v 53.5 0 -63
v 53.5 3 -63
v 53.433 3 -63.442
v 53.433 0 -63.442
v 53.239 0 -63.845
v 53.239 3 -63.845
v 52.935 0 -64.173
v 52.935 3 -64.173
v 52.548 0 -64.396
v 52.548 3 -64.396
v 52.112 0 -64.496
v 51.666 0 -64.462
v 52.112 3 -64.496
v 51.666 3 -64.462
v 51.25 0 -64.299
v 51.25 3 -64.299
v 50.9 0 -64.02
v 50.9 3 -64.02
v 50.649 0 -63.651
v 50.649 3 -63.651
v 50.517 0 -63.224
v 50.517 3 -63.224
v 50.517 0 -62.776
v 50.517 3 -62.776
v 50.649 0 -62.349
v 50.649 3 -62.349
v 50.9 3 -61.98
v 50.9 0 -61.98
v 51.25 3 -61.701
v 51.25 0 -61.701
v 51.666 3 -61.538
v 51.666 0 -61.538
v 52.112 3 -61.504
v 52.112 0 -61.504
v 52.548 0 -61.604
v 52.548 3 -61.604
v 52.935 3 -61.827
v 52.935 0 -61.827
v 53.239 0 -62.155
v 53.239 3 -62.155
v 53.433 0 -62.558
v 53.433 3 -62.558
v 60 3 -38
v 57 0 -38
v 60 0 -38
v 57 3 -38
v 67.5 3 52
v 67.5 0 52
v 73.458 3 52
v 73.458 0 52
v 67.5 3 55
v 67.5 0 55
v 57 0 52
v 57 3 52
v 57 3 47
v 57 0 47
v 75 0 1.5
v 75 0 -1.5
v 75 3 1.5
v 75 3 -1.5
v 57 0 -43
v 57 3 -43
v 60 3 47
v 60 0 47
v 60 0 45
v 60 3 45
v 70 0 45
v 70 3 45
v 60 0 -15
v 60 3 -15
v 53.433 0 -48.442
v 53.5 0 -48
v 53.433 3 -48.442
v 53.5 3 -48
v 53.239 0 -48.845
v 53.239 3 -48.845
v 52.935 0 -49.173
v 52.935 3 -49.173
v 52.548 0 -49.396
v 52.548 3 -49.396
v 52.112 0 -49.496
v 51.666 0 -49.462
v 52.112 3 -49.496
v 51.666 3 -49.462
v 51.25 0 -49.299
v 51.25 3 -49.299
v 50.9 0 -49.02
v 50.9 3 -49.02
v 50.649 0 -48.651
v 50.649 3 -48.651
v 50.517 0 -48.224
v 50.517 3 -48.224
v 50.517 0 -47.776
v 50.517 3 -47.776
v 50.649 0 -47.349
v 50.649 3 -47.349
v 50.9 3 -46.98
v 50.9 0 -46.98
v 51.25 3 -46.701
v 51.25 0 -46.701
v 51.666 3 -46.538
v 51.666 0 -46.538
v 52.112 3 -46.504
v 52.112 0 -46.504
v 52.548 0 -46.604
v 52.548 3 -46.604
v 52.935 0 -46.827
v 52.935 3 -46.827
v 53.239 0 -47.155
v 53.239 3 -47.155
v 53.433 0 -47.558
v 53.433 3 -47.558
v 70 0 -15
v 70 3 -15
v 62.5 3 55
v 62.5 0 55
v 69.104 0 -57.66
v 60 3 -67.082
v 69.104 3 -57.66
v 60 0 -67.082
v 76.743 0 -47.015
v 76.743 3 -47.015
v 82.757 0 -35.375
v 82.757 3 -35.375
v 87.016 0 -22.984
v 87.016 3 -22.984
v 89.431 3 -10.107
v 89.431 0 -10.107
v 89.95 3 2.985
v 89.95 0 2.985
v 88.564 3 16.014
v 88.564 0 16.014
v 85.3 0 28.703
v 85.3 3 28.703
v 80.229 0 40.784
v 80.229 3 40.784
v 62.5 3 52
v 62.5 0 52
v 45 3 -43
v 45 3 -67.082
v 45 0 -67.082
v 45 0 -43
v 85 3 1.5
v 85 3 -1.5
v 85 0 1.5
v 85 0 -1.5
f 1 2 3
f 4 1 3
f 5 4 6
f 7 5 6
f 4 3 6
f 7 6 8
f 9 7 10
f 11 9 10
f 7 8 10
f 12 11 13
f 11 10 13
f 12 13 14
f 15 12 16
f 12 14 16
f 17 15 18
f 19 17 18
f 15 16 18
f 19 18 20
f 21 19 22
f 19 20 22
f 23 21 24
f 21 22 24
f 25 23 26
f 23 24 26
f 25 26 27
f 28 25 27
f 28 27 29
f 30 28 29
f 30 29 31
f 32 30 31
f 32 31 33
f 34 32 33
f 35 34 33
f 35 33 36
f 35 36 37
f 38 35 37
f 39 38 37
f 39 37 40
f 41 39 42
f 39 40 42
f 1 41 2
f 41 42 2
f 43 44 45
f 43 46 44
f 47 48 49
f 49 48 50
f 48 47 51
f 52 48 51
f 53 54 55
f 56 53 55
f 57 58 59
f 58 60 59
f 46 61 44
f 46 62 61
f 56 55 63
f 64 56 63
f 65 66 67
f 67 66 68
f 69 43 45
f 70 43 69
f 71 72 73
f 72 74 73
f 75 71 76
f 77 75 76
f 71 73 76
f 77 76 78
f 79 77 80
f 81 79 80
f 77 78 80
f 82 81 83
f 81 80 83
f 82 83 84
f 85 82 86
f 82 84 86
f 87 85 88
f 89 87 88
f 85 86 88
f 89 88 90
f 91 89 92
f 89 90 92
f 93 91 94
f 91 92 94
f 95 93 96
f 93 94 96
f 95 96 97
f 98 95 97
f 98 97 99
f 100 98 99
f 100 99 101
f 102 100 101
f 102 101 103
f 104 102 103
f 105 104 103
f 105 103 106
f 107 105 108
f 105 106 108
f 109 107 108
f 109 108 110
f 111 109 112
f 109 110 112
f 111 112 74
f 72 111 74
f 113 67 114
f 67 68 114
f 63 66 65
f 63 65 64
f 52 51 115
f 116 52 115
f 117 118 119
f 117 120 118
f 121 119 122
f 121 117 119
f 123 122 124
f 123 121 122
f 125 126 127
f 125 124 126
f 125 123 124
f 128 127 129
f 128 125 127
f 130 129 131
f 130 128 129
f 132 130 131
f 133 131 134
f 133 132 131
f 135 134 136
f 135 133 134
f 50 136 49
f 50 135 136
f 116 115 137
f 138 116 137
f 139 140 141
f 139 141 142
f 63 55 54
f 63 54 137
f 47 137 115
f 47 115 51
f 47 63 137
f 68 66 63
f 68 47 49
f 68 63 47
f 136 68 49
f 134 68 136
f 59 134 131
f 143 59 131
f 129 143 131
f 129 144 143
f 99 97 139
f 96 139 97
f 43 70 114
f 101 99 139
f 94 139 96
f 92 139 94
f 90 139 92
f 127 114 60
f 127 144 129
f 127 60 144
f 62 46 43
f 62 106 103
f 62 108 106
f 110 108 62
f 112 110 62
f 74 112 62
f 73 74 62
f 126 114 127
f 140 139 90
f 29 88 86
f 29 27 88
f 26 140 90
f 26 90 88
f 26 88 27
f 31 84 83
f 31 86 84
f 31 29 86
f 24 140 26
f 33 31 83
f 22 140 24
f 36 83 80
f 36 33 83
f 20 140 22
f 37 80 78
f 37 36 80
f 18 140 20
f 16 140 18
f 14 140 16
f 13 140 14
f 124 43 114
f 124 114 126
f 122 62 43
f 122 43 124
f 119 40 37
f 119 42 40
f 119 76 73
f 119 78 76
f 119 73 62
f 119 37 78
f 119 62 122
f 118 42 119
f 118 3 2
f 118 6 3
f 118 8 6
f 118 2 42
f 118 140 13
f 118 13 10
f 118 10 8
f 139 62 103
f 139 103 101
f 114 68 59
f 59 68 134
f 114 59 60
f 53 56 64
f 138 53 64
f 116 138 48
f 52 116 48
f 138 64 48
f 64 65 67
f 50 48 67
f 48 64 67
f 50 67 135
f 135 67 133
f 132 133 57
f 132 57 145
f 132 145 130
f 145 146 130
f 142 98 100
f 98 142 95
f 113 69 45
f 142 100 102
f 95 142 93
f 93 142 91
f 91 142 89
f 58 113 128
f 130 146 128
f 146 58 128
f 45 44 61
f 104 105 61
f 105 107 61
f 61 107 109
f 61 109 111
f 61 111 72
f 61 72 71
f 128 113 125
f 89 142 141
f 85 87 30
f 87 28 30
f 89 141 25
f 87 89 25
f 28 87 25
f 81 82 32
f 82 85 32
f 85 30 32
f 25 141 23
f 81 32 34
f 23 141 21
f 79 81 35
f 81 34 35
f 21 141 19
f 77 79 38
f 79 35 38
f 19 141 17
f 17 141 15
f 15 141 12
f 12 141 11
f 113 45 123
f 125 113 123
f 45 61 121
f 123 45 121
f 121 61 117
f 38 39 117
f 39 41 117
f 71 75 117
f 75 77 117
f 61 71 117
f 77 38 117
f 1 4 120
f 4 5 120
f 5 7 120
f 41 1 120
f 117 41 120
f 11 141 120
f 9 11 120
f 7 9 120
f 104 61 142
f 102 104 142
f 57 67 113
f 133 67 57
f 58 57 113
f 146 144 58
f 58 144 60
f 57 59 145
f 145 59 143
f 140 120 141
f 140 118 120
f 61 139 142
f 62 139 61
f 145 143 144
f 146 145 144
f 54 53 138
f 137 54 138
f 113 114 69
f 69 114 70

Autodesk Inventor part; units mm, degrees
ref_plane "YZ Plane" through (0, 0, 0) normal (1, 0, 0) x (0, 1, 0)
ref_plane "XZ Plane" through (0, 0, 0) normal (0, 1, 0) x (-1, 0, 0)
ref_plane "XY Plane" through (0, 0, 0) normal (0, 0, 1) x (1, 0, 0)
sketch "Sketch1" plane through (0, 0, 0) normal (0, 1, 0) x (-1, 0, 0)
  circle A0 centre (0, 0) radius 90
  line L0 (73.4575, 52) -> (-73.4575, 52)
  dimension "d0" = 180
  dimension "d1" = 52
extrude "Extrusion1" add sketch "Sketch1" along normal blind 3 contours A0 L0 picked at (17.1608, -0.9679)
sketch "Sketch2" plane through (0, 3, 0) normal (0, 1, 0) x (1, 0, 0)
  line L0 (-73.4575, -52) -> (73.4575, -52) projected
  line L1 (60, -52) -> (-90, -52)
  line L2 (-90, -52) -> (-90, 90)
  line L3 (-90, 90) -> (60, 90)
  line L4 (60, 90) -> (60, -52)
  arc A0 (73.4575, -52) -> (-73.4575, -52) centre (0, 0) ccw projected
  dimension "d4" = 60
extrude "Extrusion2" cut sketch "Sketch2" against normal blind 3 contours A0 L4 L0 | L1 L2 A0 | L2 L3 A0 | A0 L3 L4 picked at (-22.3183, 24.985)
sketch "Sketch3" plane through (0, 3, 0) normal (0, 1, 0) x (1, 0, 0)
  line L0 (60, 67.082) -> (45, 67.082)
  line L1 (45, 67.082) -> (45, 43)
  line L2 (45, 43) -> (60, 43)
  line L3 (60, 43) -> (60, 67.082)
  line L4 (60, -52) -> (73.4575, -52) projected
  line L5 (60, -52) -> (57, -52)
  line L6 (57, -52) -> (57, -47)
  line L7 (57, -47) -> (60, -47)
  line L8 (60, -47) -> (60, -52)
  point P0 (0, 0)
  dimension "d7" = 15
  dimension "d8" = 95
  dimension "d9" = 3
  dimension "d10" = 5
extrude "Extrusion3" add sketch "Sketch3" against normal blind 3
sketch "Sketch4" plane through (0, 3, 0) normal (0, 1, 0) x (1, 0, 0)
  line L0 (60, -47) -> (60, 43) projected
  line L1 (60, -45) -> (70, -45)
  line L2 (70, -45) -> (70, 15)
  line L3 (70, 15) -> (60, 15)
  line L4 (60, 15) -> (60, -45)
  line L5 (57, -52) -> (73.4575, -52) projected
  point P0 (0, 0)
  dimension "d13" = 10
  dimension "d14" = 60
  dimension "d15" = 7
extrude "Extrusion4" cut sketch "Sketch4" against normal blind 3
sketch "Sketch5" plane through (0, 3, 0) normal (0, 1, 0) x (1, 0, 0)
  line L0 (75, -1.5) -> (85, -1.5)
  line L1 (85, -1.5) -> (85, 1.5)
  line L2 (85, 1.5) -> (75, 1.5)
  line L3 (75, 1.5) -> (75, -1.5)
  line L4 (70, -45) -> (70, 15) projected
  point P0 (0, 0)
  point P1 (75, 0)
  dimension "d18" = 10
  dimension "d19" = 3
  dimension "d20" = 5
extrude "Extrusion5" cut sketch "Sketch5" against normal blind 3
sketch "Sketch6" plane through (0, 3, 0) normal (0, 1, 0) x (1, 0, 0)
  circle A0 centre (52, 48) radius 1.5
  circle A1 centre (52, 63) radius 1.5
  line L0 (60, 43) -> (60, 15) projected
  line L1 (45, 43) -> (60, 43) projected
  point P0 (0, 0)
  dimension "d23" = 3
  dimension "d24" = 3
  dimension "d25" = 15
  dimension "d26" = 8
  dimension "d27" = 5
extrude "Extrusion6" cut sketch "Sketch6" against normal blind 3
sketch "Sketch7" plane through (0, 3, 0) normal (0, 1, 0) x (1, 0, 0)
  line L0 (60, 43) -> (57, 43)
  line L1 (57, 43) -> (57, 38)
  line L2 (57, 38) -> (60, 38)
  line L3 (60, 38) -> (60, 43)
  point P0 (0, 0)
  dimension "d30" = 3
  dimension "d31" = 5
extrude "Extrusion7" add sketch "Sketch7" against normal blind 3
sketch "Sketch8" plane through (0, 3, 0) normal (0, 1, 0) x (1, 0, 0)
  line L0 (57, -52) -> (73.4575, -52) projected
  line L1 (62.5, -52) -> (67.5, -52)
  line L2 (67.5, -52) -> (67.5, -55)
  line L3 (67.5, -55) -> (62.5, -55)
  line L4 (62.5, -55) -> (62.5, -52)
  line L5 (60, -45) -> (60, -47) projected
  point P0 (0, 0)
  dimension "d34" = 5
  dimension "d35" = 3
  dimension "d36" = 2.5
extrude "Extrusion8" add sketch "Sketch8" against normal blind 3
properties part number "Out side rib"
